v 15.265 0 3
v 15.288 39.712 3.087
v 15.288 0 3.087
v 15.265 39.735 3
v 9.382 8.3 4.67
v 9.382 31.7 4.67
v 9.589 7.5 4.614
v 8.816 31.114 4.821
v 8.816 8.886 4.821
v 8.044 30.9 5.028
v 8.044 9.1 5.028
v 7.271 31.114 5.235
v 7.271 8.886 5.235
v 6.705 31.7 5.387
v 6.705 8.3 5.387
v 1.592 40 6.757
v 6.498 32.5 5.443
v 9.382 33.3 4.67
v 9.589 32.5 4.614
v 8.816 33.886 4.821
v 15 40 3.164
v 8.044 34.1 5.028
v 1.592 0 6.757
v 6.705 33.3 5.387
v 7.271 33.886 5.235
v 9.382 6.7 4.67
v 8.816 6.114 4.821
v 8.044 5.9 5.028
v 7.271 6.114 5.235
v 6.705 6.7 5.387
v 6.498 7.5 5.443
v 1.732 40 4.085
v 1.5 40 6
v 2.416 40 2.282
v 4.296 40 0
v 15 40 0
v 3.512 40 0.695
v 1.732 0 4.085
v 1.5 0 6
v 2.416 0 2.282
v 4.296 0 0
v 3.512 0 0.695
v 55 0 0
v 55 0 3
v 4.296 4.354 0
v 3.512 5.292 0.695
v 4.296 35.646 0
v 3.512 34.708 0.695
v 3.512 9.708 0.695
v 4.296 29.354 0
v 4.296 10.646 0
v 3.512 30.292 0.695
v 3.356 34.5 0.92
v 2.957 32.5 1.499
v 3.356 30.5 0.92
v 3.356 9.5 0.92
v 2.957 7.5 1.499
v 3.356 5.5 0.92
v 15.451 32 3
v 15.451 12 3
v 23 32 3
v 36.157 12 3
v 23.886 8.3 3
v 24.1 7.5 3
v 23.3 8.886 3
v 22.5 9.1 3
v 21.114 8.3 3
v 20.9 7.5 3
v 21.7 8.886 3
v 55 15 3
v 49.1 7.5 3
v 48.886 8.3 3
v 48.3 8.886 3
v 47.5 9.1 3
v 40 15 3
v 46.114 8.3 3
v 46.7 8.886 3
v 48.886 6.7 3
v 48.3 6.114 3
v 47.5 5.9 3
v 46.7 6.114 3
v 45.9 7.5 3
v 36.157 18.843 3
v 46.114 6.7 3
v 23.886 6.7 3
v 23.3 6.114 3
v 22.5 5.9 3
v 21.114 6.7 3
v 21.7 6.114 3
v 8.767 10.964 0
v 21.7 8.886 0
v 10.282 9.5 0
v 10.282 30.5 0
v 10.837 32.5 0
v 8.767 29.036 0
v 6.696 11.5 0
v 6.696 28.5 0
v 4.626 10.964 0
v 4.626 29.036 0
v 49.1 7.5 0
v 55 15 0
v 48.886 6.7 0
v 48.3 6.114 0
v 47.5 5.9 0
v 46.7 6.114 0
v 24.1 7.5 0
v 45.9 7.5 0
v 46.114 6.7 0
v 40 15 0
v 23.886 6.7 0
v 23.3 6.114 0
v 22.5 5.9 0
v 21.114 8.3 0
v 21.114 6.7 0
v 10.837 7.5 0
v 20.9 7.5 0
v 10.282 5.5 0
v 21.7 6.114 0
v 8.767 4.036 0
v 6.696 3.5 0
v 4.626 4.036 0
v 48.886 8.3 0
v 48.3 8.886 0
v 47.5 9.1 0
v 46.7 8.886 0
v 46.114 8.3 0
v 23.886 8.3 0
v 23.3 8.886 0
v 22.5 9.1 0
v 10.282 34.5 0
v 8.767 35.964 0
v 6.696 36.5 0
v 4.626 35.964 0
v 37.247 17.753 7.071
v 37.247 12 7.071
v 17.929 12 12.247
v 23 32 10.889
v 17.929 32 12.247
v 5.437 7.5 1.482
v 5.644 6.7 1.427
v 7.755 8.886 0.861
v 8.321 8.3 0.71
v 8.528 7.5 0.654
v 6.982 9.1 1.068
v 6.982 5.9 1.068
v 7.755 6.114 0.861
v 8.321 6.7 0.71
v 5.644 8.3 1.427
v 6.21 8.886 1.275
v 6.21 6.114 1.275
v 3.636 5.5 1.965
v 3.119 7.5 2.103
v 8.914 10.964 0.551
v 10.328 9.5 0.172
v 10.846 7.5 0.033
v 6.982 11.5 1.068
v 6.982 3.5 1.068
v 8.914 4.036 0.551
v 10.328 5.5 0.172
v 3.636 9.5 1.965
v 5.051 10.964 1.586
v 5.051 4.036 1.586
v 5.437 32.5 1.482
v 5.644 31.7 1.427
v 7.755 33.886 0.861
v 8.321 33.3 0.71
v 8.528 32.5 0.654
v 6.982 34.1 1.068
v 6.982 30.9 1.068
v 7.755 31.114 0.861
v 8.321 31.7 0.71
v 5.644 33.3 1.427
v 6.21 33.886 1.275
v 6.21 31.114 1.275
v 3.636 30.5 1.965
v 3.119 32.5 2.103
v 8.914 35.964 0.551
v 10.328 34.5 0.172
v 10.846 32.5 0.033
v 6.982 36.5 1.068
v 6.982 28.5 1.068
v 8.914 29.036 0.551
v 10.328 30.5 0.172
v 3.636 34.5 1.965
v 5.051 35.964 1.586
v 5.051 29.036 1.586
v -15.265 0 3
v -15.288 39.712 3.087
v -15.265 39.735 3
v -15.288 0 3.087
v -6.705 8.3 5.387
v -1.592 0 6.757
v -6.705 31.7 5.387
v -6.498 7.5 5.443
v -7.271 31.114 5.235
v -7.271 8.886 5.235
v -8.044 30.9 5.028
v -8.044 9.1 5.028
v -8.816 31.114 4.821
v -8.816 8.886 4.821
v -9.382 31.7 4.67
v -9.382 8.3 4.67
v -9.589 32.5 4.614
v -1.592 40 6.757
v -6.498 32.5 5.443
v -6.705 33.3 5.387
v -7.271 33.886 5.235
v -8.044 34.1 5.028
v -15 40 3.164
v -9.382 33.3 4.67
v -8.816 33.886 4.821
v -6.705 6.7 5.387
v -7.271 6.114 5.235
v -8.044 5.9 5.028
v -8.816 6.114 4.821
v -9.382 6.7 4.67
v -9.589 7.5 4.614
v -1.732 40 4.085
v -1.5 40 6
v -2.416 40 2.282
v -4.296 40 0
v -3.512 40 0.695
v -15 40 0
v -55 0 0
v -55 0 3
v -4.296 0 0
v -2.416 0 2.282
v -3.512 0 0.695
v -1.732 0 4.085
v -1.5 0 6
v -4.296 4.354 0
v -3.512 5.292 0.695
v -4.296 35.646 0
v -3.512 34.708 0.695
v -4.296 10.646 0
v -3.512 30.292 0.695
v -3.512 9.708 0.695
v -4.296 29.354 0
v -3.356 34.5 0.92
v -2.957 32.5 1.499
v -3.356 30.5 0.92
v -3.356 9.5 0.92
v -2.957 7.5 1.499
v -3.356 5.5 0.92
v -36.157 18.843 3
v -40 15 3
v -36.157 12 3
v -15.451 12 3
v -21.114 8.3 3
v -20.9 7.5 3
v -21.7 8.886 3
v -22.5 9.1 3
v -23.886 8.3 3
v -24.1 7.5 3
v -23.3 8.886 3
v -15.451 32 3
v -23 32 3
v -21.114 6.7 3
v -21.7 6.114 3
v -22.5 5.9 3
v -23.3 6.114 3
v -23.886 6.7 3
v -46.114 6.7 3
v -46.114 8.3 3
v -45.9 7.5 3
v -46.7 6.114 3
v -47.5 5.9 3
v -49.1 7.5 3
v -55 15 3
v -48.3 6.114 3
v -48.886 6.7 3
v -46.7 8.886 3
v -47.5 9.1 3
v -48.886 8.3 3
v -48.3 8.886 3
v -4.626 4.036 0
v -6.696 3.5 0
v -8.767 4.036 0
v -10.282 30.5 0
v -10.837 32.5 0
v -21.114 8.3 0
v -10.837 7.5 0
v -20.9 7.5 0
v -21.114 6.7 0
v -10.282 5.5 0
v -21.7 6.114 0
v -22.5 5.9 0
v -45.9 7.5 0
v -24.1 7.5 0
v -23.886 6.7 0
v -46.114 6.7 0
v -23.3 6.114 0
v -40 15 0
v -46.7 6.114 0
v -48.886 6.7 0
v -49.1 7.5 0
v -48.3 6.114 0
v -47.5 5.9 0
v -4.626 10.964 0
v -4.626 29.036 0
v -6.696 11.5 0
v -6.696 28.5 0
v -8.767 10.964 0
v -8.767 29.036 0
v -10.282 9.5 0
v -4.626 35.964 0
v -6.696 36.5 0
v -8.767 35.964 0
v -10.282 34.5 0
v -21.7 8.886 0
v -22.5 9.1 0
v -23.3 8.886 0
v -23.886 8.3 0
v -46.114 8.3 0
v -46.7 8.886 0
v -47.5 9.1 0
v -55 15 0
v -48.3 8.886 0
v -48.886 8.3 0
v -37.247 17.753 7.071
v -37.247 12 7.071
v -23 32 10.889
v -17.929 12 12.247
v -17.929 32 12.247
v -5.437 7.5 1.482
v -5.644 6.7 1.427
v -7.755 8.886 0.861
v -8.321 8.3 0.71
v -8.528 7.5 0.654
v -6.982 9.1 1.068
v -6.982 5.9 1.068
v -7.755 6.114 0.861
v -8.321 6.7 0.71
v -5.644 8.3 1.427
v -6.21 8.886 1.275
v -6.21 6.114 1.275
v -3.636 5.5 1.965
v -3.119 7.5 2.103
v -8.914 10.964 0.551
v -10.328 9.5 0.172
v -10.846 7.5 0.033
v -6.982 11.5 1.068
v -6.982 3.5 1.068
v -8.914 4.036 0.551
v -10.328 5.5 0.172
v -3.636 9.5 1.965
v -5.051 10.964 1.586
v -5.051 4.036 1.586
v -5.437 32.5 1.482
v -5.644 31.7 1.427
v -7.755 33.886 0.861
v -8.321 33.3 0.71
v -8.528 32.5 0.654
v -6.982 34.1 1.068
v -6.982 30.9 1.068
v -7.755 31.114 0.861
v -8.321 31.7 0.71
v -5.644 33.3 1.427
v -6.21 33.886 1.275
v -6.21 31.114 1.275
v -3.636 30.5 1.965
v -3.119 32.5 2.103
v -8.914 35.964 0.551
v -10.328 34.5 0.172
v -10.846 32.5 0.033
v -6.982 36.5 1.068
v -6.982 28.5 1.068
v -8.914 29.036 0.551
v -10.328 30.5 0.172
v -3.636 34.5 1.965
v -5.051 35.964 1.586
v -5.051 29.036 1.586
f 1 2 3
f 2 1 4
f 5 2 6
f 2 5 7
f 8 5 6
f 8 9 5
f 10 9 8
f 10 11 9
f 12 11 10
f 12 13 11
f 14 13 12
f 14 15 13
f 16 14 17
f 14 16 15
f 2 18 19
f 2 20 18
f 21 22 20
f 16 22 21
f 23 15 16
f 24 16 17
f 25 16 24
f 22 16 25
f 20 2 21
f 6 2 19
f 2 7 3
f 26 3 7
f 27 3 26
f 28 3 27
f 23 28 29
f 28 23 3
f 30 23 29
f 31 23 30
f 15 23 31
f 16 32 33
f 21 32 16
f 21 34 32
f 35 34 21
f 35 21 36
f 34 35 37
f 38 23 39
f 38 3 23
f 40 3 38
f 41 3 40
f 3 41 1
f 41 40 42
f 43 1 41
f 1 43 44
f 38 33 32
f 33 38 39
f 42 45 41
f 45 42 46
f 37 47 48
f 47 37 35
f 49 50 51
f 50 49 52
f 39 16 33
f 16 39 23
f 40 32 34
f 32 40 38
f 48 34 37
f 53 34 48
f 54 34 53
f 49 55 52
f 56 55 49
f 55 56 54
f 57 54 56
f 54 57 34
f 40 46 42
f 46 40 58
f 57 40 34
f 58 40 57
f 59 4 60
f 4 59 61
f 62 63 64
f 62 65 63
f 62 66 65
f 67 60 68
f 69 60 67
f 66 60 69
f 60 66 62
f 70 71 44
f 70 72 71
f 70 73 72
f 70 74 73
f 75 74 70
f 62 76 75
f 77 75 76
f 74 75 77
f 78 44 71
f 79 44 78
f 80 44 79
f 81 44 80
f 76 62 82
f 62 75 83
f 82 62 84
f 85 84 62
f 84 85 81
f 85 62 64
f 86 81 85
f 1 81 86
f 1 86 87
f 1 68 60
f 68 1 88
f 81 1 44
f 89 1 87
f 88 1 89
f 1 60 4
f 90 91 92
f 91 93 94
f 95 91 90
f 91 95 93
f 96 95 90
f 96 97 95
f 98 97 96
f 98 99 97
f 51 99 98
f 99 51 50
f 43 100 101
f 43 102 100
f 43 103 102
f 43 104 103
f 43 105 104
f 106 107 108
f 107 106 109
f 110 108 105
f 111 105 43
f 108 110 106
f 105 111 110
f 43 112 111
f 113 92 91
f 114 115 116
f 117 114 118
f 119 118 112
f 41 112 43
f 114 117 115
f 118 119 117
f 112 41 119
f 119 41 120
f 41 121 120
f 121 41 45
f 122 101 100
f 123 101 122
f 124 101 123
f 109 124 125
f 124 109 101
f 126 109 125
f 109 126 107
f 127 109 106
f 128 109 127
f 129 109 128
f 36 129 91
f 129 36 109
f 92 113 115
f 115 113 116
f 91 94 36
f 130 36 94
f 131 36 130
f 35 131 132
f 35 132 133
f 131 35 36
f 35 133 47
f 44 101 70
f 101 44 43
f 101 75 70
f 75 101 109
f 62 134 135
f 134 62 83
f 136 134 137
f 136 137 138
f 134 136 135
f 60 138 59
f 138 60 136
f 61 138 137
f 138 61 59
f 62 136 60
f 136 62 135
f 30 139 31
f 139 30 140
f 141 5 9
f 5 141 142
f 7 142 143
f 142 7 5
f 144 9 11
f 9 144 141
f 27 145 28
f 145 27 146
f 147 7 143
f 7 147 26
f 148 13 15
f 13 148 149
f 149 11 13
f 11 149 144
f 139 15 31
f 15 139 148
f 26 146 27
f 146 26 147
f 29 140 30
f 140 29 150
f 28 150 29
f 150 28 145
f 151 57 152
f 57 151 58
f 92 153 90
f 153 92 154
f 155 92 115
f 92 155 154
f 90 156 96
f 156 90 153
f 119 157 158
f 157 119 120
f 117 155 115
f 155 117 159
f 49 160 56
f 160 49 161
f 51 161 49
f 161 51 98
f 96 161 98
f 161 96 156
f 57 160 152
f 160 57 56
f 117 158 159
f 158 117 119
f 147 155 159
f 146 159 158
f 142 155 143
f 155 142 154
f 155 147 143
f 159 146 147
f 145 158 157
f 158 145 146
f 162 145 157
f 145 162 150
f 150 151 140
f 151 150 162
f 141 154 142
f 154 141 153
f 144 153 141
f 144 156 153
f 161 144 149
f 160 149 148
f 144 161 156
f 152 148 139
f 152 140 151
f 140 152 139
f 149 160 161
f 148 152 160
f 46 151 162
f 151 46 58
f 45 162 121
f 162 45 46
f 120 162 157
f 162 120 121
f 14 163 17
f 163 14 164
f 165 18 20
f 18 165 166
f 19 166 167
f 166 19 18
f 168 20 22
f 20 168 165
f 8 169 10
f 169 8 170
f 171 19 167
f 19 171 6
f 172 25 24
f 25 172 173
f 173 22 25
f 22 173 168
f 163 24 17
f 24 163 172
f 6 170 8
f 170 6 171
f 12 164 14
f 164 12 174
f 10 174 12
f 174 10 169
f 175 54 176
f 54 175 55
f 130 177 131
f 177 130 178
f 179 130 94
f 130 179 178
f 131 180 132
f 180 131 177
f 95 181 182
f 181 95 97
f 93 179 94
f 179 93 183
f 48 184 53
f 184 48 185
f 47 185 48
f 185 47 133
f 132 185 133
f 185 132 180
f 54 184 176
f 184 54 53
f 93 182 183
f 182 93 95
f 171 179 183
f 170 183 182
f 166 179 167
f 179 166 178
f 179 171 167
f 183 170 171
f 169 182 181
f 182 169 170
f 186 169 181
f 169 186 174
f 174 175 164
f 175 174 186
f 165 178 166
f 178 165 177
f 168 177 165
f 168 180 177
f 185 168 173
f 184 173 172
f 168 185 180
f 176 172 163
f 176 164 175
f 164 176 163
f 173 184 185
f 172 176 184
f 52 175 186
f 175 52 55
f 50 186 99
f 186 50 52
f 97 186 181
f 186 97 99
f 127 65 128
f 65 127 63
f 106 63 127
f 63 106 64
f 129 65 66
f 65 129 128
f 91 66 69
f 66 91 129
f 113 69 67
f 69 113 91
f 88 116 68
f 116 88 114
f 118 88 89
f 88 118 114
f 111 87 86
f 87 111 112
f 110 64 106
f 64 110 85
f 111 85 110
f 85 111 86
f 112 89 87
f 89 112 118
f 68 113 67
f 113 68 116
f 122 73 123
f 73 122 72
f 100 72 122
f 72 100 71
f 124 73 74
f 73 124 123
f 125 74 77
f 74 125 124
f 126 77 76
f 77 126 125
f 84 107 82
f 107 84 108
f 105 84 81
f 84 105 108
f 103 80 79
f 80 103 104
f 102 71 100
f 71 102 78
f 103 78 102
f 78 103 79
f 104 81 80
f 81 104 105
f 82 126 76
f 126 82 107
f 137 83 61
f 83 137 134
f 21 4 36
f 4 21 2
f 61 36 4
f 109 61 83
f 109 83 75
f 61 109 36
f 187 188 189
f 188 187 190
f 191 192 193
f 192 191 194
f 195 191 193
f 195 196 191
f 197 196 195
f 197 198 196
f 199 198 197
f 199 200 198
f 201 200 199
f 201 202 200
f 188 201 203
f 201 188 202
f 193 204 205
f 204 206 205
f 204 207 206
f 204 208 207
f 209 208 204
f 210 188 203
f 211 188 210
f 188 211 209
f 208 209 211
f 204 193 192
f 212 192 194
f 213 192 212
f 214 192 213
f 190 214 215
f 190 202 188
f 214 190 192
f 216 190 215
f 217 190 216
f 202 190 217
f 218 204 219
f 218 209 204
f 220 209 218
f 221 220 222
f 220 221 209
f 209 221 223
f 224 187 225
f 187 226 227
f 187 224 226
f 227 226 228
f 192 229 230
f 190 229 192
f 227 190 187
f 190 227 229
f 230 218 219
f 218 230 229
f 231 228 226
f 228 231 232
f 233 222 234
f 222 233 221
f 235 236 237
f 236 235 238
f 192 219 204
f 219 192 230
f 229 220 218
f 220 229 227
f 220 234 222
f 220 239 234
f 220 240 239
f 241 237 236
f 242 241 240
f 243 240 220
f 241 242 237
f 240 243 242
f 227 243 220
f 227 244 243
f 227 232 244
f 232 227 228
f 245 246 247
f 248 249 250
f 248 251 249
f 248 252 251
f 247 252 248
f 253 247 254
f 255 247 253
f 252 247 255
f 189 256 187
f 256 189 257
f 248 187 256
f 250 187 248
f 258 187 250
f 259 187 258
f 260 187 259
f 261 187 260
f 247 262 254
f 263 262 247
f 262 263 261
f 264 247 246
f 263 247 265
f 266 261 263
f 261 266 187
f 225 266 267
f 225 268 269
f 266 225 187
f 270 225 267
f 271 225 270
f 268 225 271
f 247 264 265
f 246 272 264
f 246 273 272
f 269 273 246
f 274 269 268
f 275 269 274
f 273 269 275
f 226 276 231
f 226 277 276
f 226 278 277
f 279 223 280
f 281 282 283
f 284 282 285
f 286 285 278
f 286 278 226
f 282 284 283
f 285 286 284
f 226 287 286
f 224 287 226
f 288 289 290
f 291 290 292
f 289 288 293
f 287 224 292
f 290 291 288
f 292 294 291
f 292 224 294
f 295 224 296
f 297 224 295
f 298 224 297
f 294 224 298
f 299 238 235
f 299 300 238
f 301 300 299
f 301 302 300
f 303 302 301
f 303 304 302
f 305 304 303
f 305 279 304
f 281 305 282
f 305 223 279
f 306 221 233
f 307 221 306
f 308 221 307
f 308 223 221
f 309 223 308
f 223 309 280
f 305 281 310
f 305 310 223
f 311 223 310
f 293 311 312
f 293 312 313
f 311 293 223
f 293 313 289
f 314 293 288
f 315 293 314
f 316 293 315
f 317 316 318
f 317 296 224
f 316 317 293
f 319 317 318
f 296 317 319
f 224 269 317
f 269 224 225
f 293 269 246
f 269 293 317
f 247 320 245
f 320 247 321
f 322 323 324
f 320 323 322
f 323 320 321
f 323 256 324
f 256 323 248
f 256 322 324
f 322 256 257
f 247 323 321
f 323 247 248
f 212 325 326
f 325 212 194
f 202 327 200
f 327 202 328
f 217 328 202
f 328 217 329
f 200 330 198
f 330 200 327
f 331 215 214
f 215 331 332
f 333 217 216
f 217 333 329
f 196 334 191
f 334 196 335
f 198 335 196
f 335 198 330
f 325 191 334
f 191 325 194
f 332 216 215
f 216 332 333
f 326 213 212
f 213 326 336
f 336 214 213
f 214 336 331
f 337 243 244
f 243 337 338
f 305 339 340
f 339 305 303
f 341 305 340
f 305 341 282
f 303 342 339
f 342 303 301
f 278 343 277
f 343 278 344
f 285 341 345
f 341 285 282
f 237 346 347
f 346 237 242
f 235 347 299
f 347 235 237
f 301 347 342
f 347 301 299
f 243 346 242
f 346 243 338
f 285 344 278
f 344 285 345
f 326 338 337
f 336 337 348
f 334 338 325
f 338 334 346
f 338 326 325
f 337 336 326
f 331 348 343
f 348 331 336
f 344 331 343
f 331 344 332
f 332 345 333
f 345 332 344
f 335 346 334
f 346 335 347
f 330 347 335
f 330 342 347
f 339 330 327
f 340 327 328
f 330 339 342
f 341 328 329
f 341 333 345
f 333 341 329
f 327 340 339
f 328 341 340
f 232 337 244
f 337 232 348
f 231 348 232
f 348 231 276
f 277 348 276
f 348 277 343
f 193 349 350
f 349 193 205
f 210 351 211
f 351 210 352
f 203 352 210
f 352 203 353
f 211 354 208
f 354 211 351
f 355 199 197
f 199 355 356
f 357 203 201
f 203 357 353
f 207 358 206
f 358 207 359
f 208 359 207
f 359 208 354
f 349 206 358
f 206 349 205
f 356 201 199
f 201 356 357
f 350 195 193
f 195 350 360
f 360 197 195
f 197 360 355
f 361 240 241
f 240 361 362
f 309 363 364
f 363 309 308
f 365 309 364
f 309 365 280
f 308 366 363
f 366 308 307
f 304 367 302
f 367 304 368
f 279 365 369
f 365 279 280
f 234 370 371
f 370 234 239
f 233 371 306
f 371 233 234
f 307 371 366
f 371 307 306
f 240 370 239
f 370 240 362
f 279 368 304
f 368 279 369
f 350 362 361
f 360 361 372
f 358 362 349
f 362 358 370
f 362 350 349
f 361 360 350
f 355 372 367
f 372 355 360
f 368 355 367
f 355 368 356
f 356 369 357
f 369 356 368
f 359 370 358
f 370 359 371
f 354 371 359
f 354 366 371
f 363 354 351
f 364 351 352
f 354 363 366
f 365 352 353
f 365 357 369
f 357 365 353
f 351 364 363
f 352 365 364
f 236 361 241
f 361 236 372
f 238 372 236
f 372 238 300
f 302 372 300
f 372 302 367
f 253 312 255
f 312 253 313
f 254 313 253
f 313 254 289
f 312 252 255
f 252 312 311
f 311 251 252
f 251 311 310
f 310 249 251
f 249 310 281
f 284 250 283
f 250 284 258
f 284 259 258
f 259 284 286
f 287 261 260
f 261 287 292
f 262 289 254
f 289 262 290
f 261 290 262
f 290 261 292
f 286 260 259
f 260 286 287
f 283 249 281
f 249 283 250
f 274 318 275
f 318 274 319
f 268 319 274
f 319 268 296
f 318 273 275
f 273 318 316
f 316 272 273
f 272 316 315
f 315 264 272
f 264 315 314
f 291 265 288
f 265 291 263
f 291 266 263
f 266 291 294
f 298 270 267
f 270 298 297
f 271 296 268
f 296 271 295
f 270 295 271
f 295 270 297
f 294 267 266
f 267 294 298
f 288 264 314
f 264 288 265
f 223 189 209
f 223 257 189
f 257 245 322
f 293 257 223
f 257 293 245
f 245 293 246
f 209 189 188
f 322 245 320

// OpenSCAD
length = 40;
thickness = 3;

module frame_90() {
  difference() {
    union() {
      translate([length/2+5, length/2, thickness/2])
	cube([length-10, length, thickness], center=true);
      translate([length/2+15, 7.5, thickness/2])
	cube([length, 15, thickness], center=true);
      translate([7.5, length/2, thickness]) intersection() {
	rotate([0, 15, 0]) translate([0, 0, -0.8*thickness])
	  cube([15, length, 3 * thickness], center=true);
	rotate([90, 0, 0]) translate([2, 3, 0])
	  cylinder(r=8, h=length, center=true);
      }
      // Tensioner attachment.
      translate([25, 22, 0]) rotate([0, 15, 0])
	cube([20, 20, 20], center=true);
    }
    // Flat bottom for print surface.
    translate([0, 0, -10]) cube([3*length, 3*length, 20], center=true);
    // Screw holes for vertical beam.
    for (y = [7.5:length-15:length]) {
      translate([7.5, y, thickness]) rotate([0, 15, 0]) {
	translate([0, 0, -thickness])
	  cylinder(r=1.6, h=20, center=true, $fn=12);
	translate([0, 0, -7]) cylinder(r=4, h=10, center=true, $fn=12);
      }
    }
    // Screw holes for horizontal beam.
    for (x = [22.5:length-15:length+15]) {
      translate([x, 7.5, 0]) cylinder(r=1.6, h=20, center=true, $fn=12);
    }
    // Big cutout.
    translate([length, length, 0])
      # cylinder(r=length-15, h=60, center=true, $fn=4);
  }
}

scale([-1, 1, 1])
frame_90();
frame_90();
